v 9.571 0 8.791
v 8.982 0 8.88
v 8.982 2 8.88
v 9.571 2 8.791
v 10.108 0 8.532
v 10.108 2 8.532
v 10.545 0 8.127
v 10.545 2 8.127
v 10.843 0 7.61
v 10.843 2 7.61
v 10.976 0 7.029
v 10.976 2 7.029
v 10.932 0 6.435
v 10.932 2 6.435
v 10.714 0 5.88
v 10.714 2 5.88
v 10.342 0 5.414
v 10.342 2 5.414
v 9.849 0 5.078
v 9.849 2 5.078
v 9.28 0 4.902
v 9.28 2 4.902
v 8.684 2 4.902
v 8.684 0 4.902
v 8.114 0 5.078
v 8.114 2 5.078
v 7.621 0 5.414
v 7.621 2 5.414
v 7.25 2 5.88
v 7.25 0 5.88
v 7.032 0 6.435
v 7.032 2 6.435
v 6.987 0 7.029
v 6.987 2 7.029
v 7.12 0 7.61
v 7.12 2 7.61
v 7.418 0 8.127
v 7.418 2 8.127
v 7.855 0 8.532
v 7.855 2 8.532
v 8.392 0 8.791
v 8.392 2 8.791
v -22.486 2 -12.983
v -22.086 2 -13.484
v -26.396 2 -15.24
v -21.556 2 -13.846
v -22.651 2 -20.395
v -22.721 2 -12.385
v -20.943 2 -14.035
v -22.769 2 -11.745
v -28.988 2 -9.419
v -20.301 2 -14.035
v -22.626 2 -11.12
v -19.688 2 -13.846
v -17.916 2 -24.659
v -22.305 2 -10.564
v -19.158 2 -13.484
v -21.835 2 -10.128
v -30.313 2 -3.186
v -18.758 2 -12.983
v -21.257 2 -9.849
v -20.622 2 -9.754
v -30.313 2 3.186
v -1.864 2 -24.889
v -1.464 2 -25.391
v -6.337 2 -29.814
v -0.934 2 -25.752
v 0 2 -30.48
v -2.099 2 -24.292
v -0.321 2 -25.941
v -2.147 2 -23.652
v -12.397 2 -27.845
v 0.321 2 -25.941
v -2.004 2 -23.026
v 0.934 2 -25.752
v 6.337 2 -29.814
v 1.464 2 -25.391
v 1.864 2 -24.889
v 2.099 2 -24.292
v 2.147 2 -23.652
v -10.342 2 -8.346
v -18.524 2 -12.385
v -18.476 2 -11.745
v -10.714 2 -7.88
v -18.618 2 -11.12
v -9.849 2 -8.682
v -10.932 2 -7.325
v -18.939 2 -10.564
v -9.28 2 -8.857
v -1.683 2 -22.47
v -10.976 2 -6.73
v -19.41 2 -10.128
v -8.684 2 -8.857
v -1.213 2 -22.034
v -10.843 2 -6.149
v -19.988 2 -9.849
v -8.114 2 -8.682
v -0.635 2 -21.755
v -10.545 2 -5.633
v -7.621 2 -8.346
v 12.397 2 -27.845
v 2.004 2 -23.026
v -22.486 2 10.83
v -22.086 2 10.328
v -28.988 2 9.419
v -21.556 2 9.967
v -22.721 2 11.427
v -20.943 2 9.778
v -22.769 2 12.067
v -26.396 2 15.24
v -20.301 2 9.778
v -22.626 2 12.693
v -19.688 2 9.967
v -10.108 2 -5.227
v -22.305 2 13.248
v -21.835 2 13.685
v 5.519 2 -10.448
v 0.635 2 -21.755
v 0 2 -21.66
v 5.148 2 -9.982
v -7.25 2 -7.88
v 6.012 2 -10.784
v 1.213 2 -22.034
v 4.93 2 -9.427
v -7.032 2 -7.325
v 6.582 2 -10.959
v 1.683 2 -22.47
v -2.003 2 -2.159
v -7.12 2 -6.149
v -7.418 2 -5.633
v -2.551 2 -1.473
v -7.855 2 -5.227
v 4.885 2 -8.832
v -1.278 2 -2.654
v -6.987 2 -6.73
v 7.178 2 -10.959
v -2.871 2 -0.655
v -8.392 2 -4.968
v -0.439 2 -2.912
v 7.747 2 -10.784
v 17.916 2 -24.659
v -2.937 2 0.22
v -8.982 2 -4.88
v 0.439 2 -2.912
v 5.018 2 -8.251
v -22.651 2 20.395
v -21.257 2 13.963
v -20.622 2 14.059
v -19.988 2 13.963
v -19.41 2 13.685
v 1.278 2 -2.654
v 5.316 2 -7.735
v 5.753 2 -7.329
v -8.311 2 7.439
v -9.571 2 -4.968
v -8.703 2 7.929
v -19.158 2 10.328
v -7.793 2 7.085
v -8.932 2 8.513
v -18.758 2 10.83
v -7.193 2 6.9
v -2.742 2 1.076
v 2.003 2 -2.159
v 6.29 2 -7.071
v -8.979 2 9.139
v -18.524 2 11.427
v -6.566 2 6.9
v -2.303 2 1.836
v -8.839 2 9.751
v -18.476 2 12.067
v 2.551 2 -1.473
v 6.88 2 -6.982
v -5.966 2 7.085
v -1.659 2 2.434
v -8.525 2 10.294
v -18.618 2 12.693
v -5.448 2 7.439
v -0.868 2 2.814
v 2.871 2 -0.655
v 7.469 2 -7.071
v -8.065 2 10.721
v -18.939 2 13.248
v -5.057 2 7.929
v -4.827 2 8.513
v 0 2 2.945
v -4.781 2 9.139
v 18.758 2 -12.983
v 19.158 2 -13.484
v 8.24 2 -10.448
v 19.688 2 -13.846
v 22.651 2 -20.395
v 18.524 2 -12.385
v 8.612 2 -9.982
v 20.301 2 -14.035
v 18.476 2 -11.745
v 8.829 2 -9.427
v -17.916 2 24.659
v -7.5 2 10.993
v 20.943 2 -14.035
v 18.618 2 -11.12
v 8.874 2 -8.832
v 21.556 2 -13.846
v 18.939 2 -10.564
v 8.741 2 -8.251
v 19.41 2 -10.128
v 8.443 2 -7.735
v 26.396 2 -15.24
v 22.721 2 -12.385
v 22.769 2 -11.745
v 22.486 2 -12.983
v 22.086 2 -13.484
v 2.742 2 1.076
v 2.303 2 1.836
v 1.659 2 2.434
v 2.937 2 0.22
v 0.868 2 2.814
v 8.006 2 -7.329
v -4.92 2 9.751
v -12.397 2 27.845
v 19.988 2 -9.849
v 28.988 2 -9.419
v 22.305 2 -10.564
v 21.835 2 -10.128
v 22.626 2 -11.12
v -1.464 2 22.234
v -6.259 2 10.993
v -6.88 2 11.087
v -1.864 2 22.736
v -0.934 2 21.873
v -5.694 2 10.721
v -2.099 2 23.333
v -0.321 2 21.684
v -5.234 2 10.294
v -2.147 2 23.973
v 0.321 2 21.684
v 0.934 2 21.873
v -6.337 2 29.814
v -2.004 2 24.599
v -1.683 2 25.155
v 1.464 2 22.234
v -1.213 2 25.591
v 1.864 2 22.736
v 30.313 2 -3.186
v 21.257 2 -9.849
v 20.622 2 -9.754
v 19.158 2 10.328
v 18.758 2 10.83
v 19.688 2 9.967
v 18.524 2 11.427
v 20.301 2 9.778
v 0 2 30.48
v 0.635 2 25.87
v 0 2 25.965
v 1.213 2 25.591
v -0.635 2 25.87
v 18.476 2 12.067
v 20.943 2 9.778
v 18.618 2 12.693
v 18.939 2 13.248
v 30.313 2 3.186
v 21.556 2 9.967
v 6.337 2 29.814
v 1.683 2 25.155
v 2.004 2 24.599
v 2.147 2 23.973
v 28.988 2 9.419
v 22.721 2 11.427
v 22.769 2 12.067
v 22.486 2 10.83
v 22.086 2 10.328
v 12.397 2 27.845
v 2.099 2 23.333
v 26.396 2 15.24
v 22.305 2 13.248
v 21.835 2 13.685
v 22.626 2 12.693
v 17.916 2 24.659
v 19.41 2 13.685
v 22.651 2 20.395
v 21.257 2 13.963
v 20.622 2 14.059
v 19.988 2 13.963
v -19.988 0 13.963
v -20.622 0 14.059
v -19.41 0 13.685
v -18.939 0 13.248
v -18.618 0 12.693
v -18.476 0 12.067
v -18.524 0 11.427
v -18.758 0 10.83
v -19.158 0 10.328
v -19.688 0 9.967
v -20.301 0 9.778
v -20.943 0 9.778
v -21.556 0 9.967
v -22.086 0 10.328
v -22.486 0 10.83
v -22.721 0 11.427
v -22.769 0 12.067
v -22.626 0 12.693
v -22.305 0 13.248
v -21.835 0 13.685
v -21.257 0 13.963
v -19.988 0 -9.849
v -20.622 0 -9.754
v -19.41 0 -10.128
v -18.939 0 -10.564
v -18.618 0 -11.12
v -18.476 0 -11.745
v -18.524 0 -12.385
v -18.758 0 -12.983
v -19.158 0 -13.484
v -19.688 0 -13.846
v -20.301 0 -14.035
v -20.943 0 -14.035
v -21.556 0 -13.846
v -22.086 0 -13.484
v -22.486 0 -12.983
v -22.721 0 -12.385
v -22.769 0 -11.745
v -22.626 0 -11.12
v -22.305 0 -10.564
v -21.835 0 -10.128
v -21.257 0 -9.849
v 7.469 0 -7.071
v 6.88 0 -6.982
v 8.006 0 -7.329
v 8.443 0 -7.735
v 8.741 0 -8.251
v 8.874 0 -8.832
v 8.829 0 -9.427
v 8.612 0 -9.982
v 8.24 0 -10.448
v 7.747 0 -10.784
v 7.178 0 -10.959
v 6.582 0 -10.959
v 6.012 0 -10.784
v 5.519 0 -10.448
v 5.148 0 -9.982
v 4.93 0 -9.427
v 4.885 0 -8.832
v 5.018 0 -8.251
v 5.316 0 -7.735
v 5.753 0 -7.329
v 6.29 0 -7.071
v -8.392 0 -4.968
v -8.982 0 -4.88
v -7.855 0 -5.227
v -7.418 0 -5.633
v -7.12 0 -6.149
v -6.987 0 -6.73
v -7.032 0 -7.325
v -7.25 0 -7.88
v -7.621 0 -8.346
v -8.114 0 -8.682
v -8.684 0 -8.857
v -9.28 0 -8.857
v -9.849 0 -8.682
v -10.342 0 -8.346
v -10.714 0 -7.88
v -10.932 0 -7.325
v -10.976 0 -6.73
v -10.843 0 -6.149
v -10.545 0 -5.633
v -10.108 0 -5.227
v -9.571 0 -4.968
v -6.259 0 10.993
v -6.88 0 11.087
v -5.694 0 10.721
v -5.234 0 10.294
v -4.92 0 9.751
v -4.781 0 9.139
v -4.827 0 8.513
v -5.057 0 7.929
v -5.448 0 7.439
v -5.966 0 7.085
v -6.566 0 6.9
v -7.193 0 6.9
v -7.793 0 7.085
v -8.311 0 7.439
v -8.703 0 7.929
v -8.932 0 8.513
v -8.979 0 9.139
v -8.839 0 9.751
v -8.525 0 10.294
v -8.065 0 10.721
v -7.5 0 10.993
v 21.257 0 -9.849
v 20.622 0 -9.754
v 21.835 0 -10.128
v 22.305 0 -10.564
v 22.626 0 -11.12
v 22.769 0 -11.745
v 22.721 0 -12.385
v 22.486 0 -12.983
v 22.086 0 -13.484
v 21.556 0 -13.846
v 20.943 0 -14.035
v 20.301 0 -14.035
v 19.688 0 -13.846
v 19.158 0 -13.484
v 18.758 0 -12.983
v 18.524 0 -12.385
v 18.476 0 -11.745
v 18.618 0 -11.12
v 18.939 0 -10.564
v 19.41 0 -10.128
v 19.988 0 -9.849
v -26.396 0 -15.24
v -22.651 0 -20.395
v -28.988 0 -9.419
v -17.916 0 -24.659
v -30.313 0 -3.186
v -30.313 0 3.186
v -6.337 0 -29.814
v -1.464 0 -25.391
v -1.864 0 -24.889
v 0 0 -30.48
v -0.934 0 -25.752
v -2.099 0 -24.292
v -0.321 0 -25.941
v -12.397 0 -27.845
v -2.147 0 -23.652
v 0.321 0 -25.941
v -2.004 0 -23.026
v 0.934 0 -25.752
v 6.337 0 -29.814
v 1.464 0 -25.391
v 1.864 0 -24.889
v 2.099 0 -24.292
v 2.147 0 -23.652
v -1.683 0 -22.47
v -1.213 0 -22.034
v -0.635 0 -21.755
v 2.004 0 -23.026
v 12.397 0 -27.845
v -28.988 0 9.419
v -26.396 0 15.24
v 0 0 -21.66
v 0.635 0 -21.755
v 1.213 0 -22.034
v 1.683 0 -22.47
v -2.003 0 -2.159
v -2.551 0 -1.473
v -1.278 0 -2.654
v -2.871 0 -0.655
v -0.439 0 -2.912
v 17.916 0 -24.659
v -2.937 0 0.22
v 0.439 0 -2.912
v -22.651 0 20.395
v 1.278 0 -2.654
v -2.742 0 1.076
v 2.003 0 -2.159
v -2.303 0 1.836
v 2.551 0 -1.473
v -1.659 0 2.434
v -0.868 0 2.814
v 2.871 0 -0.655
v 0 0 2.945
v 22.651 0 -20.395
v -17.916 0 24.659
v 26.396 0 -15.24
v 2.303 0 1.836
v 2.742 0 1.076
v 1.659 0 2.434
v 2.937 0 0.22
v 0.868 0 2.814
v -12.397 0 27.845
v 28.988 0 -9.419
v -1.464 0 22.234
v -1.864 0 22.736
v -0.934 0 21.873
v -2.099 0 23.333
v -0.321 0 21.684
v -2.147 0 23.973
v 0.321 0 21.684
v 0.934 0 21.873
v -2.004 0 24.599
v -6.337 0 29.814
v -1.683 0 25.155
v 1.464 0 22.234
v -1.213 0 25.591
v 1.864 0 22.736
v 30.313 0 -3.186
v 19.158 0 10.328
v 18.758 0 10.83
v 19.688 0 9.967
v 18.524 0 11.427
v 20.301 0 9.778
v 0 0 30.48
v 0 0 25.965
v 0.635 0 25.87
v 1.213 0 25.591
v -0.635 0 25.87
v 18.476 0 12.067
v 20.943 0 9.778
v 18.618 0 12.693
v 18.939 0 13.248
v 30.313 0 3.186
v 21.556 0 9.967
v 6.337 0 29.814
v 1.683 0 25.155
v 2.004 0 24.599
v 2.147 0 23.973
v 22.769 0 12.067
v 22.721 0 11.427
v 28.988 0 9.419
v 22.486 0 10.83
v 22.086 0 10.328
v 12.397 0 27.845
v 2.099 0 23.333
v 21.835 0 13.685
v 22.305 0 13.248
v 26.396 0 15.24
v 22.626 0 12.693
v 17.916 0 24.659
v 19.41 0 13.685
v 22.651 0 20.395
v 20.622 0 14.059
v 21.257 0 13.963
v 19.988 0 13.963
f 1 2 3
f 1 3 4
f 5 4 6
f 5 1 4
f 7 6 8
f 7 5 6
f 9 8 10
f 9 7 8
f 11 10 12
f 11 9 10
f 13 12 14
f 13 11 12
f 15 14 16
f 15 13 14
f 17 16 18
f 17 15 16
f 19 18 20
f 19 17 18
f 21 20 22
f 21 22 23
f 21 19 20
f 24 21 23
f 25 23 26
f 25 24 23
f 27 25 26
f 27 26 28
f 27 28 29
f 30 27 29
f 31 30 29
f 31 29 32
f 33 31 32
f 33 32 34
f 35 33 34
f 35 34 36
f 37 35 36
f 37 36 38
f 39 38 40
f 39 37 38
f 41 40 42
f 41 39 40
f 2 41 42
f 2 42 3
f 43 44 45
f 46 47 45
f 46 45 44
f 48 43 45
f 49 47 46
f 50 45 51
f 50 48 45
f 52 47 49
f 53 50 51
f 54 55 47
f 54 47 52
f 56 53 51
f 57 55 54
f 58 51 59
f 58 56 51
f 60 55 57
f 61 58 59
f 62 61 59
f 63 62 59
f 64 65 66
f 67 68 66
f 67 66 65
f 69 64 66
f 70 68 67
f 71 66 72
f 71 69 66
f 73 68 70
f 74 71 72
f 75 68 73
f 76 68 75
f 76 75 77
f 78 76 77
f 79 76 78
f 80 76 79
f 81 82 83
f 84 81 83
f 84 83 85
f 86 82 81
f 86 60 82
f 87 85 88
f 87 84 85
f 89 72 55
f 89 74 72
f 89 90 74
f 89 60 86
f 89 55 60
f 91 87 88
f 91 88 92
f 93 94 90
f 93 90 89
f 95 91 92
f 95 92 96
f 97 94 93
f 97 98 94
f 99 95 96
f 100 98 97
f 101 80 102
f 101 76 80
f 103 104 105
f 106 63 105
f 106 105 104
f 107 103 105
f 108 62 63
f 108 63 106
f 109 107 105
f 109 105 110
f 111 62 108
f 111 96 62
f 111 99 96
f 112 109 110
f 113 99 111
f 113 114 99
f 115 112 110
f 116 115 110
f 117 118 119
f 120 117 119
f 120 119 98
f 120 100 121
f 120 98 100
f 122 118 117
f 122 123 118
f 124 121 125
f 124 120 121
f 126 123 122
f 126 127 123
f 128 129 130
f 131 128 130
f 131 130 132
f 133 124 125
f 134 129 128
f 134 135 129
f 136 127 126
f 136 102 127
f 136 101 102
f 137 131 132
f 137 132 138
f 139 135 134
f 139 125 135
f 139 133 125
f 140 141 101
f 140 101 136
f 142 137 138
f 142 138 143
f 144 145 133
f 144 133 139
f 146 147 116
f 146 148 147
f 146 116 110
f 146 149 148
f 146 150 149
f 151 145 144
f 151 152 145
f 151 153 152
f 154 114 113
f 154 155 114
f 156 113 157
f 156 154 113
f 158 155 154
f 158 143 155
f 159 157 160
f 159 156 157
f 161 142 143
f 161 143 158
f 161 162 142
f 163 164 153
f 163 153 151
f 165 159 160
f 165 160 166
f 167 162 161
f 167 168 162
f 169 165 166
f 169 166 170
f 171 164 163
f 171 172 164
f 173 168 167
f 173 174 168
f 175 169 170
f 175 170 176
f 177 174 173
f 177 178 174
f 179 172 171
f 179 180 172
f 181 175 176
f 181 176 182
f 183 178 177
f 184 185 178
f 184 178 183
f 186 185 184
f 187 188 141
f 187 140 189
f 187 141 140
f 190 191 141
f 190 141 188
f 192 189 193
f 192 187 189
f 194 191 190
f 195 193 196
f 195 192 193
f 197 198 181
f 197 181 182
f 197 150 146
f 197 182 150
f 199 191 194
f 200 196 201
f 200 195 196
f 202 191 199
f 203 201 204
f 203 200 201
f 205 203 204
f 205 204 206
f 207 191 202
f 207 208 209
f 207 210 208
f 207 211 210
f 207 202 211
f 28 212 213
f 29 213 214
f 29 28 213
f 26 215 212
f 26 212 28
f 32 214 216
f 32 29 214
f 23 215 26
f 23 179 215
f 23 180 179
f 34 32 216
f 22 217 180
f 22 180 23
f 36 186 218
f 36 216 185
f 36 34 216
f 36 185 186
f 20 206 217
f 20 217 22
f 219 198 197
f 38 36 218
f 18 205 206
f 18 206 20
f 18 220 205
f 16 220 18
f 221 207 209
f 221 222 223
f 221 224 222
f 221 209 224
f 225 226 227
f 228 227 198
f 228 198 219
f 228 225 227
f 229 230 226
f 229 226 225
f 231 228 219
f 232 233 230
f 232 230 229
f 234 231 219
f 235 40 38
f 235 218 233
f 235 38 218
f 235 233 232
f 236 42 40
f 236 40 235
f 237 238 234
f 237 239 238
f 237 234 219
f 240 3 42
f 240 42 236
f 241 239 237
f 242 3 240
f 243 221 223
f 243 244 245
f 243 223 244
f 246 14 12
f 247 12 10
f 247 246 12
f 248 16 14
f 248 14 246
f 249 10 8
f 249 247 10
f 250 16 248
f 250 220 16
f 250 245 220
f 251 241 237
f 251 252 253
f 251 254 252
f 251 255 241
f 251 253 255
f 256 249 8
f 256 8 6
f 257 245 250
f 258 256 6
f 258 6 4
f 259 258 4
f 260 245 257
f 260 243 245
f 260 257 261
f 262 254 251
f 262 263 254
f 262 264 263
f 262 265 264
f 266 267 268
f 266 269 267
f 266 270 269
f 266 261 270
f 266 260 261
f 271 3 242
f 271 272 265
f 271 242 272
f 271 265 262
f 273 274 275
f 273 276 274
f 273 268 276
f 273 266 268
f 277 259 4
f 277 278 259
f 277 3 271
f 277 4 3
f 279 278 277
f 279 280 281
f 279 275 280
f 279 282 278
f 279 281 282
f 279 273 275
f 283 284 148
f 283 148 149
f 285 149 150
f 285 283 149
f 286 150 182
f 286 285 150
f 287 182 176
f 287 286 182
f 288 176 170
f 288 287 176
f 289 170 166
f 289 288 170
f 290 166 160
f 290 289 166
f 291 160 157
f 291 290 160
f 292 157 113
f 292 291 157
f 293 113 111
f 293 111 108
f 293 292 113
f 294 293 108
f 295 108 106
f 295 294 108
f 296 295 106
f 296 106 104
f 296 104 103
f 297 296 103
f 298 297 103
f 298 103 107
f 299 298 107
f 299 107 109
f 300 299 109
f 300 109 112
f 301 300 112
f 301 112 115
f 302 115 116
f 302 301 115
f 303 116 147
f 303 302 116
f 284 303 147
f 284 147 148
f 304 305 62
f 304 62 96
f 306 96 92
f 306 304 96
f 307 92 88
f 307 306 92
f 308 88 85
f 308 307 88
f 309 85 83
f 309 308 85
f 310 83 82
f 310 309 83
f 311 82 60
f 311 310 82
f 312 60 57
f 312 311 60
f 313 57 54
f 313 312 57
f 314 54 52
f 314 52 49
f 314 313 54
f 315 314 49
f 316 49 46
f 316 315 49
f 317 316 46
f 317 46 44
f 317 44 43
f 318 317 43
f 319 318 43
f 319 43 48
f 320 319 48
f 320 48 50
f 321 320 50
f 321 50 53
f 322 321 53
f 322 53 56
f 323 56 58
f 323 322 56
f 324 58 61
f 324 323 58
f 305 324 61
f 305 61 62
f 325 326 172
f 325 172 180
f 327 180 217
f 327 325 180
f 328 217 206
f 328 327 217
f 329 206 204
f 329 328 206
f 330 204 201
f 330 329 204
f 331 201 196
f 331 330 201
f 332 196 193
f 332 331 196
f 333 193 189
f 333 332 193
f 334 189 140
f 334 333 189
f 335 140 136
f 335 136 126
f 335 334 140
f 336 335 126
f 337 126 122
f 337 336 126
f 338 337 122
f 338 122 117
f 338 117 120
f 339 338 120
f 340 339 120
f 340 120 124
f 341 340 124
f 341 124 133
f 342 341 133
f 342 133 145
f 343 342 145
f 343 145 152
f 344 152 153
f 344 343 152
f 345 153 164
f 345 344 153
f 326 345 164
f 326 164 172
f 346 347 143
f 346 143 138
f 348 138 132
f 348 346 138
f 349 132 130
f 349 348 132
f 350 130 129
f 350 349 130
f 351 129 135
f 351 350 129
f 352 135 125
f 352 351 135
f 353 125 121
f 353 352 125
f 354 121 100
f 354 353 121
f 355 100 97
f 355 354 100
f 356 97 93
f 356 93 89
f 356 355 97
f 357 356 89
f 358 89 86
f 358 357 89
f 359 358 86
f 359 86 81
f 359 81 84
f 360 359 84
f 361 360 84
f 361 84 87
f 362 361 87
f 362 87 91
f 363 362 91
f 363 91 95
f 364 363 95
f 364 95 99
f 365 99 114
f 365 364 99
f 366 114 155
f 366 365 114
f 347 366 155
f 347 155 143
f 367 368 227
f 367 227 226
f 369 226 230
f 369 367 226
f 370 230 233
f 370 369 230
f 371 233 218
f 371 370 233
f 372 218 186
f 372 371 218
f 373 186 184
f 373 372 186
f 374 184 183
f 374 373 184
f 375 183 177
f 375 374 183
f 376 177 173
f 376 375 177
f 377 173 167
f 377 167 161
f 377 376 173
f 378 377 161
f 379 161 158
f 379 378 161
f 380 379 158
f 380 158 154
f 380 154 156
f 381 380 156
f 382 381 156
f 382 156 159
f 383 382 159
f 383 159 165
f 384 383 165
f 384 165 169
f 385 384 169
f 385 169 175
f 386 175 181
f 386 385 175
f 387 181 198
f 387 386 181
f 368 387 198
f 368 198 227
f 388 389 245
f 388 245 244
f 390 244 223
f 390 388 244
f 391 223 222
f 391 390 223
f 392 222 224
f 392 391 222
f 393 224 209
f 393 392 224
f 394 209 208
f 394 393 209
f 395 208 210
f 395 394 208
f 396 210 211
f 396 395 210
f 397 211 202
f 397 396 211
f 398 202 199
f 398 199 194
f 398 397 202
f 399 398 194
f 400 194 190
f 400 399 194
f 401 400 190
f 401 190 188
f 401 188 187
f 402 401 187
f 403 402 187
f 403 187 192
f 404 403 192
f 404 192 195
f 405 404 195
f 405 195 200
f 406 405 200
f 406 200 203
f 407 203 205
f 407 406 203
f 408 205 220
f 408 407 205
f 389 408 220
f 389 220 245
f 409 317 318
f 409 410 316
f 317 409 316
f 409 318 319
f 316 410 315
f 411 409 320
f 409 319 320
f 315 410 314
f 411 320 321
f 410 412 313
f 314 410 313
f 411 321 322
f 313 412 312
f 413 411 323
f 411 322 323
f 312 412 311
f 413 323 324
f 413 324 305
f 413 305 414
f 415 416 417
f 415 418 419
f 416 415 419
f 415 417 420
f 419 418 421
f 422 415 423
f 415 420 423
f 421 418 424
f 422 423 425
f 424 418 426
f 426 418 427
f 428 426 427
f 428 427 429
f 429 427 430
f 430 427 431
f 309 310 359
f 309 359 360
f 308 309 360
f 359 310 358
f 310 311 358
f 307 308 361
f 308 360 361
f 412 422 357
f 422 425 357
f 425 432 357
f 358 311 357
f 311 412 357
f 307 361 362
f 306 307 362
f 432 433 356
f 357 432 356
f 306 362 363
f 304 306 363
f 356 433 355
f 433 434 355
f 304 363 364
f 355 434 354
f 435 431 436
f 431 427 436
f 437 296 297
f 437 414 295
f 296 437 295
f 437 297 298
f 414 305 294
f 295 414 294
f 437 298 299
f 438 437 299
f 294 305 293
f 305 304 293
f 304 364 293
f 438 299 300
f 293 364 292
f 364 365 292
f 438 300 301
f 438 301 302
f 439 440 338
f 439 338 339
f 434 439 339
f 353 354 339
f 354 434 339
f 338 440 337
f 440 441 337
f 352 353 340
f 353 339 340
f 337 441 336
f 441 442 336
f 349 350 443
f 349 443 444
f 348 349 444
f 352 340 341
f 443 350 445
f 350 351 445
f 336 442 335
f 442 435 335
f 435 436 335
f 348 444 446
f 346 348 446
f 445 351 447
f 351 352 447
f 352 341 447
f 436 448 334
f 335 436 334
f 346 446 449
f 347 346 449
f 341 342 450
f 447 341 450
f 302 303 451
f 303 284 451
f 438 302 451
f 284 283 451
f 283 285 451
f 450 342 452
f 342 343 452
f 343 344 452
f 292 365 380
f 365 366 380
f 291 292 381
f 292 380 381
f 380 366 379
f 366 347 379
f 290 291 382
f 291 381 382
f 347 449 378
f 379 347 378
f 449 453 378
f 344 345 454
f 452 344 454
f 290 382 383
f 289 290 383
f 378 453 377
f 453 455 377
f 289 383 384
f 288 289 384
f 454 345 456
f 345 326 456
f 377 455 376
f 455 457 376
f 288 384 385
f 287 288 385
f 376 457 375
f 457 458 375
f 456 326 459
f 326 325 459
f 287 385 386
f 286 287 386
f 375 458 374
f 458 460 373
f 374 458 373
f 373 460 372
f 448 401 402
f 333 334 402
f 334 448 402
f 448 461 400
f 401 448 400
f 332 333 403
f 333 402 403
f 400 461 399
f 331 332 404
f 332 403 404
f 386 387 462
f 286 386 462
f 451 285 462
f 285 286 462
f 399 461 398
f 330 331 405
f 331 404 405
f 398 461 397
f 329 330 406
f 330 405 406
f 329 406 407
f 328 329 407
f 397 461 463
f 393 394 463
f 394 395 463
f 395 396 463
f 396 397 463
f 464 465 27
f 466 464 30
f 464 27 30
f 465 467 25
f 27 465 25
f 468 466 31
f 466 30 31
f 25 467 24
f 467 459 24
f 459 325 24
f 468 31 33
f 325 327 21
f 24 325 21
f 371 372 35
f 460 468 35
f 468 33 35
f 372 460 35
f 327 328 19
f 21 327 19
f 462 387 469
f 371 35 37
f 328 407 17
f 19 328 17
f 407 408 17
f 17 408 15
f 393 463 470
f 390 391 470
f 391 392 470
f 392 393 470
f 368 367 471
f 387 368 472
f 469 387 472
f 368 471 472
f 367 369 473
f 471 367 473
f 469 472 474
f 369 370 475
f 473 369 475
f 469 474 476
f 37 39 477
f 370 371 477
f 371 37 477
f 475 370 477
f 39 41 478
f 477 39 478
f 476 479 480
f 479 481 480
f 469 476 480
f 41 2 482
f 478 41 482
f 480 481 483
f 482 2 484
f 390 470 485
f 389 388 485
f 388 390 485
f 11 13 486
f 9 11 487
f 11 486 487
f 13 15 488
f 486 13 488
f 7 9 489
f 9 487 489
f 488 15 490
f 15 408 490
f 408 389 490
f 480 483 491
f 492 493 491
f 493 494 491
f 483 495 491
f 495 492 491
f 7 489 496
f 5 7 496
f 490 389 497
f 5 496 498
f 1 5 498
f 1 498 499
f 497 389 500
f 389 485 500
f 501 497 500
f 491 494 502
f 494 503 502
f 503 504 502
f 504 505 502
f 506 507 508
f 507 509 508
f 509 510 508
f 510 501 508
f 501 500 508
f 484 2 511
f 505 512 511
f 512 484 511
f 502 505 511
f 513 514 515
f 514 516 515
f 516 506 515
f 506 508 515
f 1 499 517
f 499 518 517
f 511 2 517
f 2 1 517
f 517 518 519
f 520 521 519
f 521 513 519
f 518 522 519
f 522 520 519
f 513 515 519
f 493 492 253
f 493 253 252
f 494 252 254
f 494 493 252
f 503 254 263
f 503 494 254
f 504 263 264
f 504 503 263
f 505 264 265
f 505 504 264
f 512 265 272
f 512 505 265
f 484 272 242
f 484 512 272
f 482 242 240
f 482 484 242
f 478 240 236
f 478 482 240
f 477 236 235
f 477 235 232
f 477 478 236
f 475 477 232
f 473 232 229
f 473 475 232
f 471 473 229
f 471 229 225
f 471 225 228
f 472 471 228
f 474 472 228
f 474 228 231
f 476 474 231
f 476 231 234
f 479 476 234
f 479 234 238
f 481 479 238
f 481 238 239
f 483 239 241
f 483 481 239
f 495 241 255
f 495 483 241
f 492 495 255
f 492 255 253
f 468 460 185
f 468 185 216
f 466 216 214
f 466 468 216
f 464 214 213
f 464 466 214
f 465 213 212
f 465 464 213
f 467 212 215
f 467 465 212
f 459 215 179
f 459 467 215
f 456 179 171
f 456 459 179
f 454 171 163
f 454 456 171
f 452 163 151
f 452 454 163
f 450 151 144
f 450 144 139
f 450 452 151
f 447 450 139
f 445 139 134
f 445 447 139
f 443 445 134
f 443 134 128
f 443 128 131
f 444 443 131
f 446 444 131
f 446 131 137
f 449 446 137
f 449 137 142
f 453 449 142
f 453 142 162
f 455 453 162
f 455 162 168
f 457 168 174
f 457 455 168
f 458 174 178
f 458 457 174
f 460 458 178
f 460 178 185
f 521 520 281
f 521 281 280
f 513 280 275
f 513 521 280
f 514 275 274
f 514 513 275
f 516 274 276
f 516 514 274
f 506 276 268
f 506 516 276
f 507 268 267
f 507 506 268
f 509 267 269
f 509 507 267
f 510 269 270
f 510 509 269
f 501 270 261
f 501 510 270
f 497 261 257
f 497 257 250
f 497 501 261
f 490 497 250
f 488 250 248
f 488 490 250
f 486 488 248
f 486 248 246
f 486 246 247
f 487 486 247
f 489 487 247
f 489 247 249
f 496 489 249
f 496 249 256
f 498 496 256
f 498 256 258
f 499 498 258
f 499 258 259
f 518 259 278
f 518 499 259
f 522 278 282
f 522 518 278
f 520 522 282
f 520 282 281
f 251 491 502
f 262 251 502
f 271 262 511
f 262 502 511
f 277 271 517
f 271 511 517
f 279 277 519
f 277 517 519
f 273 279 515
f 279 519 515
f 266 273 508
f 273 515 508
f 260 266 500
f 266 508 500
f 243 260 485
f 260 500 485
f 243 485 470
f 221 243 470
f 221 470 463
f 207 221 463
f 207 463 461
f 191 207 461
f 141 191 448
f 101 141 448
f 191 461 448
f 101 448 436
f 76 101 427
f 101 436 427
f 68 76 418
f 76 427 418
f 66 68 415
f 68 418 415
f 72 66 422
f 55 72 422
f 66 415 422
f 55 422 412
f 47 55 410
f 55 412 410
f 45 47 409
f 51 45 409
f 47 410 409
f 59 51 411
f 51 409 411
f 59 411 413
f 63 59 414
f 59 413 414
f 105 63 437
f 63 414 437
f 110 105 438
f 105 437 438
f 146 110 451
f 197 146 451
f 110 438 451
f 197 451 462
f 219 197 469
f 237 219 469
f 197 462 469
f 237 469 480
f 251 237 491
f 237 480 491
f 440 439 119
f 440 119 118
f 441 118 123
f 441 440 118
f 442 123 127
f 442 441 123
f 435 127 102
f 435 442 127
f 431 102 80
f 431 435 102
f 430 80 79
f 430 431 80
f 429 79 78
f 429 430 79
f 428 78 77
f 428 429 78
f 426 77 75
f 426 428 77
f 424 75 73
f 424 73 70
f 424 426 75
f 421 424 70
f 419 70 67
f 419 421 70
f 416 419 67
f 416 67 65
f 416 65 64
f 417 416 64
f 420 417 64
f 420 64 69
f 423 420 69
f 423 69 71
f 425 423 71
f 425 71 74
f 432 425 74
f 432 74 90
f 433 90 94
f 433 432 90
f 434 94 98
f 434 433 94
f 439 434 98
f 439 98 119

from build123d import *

# Parameters (mm, degrees)
SKETCH1_R           = 30.48
SKETCH1_R_2         = 2.15265
SKETCH1_R_3         = 2.9453237
SKETCH1_R_4         = 2
SKETCH1_R_5         = 2.104990058
BOSS_EXTRUDE1_DEPTH = 2


with BuildPart() as part:
    # Sketch1 → Boss-Extrude1 (new body)
    with BuildSketch(Plane(origin=(0, 0, 0), x_dir=(1, 0, 0), z_dir=(0, 1, 0))):
        with Locations(Location((0, 0, 0), (0, 0, 270))):
            Circle(SKETCH1_R)
        with Locations(Location((0, -23.8125, 0), (0, 0, 270))):
            Circle(SKETCH1_R_2, mode=Mode.SUBTRACT)
        with Locations(Location((20.622229928, -11.90625, 0), (0, 0, 270))):
            Circle(SKETCH1_R_2, mode=Mode.SUBTRACT)
        with Locations(Location((20.622229928, 11.90625, 0), (0, 0, 270))):
            Circle(SKETCH1_R_2, mode=Mode.SUBTRACT)
        with Locations(Location((0, 23.8125, 0), (0, 0, 270))):
            Circle(SKETCH1_R_2, mode=Mode.SUBTRACT)
        with Locations(Location((-20.622229928, 11.90625, 0), (0, 0, 270))):
            Circle(SKETCH1_R_2, mode=Mode.SUBTRACT)
        with Locations(Location((-20.622229928, -11.90625, 0), (0, 0, 270))):
            Circle(SKETCH1_R_2, mode=Mode.SUBTRACT)
        with Locations(Location((0, 0, 0), (0, 0, 270))):
            Circle(SKETCH1_R_3, mode=Mode.SUBTRACT)
        with Locations(Location((-8.981689404, 6.879626113, 0), (0, 0, 270))):
            Circle(SKETCH1_R_4, mode=Mode.SUBTRACT)
        with Locations(Location((6.879626113, 8.981689404, 0), (0, 0, 270))):
            Circle(SKETCH1_R_4, mode=Mode.SUBTRACT)
        with Locations(Location((8.981689404, -6.879626113, 0), (0, 0, 270))):
            Circle(SKETCH1_R_4, mode=Mode.SUBTRACT)
        with Locations(Location((-6.879626113, -8.981689404, 0), (0, 0, 270))):
            Circle(SKETCH1_R_5, mode=Mode.SUBTRACT)
    extrude(amount=BOSS_EXTRUDE1_DEPTH)


solid = part.part
